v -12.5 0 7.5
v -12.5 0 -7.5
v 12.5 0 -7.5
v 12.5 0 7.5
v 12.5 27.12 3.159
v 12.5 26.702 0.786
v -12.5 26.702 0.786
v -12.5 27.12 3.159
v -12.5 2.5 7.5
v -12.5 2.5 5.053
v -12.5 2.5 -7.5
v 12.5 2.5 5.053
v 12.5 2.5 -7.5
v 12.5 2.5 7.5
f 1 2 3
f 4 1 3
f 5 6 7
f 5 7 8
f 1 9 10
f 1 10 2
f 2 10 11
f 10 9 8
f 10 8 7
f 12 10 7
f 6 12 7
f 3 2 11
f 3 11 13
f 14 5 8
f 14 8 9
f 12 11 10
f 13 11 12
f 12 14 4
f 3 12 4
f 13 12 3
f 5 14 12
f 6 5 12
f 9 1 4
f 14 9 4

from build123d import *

# Parameters (mm, degrees)
SKETCH1_W           = 25
SKETCH1_H           = 15
BOSS_EXTRUDE1_DEPTH = 2.5
BOSS_EXTRUDE2_DEPTH = 25


with BuildPart() as part:
    # Sketch1 → Boss-Extrude1 (new body)
    with BuildSketch(Plane(origin=(0, 0, 0), x_dir=(1, 0, 0), z_dir=(0, 1, 0))):
        Rectangle(SKETCH1_W, SKETCH1_H)
    extrude(amount=BOSS_EXTRUDE1_DEPTH)

    # Sketch2 → Boss-Extrude2 (add, through all)
    with BuildSketch(Plane.ZY.offset(12.5)):
        Polygon((0.785626796, 26.701740143), (3.158795558, 27.120193825), (7.5, 2.5), (5.126831238, 2.081546317), align=None)
    extrude(amount=-BOSS_EXTRUDE2_DEPTH)


solid = part.part
